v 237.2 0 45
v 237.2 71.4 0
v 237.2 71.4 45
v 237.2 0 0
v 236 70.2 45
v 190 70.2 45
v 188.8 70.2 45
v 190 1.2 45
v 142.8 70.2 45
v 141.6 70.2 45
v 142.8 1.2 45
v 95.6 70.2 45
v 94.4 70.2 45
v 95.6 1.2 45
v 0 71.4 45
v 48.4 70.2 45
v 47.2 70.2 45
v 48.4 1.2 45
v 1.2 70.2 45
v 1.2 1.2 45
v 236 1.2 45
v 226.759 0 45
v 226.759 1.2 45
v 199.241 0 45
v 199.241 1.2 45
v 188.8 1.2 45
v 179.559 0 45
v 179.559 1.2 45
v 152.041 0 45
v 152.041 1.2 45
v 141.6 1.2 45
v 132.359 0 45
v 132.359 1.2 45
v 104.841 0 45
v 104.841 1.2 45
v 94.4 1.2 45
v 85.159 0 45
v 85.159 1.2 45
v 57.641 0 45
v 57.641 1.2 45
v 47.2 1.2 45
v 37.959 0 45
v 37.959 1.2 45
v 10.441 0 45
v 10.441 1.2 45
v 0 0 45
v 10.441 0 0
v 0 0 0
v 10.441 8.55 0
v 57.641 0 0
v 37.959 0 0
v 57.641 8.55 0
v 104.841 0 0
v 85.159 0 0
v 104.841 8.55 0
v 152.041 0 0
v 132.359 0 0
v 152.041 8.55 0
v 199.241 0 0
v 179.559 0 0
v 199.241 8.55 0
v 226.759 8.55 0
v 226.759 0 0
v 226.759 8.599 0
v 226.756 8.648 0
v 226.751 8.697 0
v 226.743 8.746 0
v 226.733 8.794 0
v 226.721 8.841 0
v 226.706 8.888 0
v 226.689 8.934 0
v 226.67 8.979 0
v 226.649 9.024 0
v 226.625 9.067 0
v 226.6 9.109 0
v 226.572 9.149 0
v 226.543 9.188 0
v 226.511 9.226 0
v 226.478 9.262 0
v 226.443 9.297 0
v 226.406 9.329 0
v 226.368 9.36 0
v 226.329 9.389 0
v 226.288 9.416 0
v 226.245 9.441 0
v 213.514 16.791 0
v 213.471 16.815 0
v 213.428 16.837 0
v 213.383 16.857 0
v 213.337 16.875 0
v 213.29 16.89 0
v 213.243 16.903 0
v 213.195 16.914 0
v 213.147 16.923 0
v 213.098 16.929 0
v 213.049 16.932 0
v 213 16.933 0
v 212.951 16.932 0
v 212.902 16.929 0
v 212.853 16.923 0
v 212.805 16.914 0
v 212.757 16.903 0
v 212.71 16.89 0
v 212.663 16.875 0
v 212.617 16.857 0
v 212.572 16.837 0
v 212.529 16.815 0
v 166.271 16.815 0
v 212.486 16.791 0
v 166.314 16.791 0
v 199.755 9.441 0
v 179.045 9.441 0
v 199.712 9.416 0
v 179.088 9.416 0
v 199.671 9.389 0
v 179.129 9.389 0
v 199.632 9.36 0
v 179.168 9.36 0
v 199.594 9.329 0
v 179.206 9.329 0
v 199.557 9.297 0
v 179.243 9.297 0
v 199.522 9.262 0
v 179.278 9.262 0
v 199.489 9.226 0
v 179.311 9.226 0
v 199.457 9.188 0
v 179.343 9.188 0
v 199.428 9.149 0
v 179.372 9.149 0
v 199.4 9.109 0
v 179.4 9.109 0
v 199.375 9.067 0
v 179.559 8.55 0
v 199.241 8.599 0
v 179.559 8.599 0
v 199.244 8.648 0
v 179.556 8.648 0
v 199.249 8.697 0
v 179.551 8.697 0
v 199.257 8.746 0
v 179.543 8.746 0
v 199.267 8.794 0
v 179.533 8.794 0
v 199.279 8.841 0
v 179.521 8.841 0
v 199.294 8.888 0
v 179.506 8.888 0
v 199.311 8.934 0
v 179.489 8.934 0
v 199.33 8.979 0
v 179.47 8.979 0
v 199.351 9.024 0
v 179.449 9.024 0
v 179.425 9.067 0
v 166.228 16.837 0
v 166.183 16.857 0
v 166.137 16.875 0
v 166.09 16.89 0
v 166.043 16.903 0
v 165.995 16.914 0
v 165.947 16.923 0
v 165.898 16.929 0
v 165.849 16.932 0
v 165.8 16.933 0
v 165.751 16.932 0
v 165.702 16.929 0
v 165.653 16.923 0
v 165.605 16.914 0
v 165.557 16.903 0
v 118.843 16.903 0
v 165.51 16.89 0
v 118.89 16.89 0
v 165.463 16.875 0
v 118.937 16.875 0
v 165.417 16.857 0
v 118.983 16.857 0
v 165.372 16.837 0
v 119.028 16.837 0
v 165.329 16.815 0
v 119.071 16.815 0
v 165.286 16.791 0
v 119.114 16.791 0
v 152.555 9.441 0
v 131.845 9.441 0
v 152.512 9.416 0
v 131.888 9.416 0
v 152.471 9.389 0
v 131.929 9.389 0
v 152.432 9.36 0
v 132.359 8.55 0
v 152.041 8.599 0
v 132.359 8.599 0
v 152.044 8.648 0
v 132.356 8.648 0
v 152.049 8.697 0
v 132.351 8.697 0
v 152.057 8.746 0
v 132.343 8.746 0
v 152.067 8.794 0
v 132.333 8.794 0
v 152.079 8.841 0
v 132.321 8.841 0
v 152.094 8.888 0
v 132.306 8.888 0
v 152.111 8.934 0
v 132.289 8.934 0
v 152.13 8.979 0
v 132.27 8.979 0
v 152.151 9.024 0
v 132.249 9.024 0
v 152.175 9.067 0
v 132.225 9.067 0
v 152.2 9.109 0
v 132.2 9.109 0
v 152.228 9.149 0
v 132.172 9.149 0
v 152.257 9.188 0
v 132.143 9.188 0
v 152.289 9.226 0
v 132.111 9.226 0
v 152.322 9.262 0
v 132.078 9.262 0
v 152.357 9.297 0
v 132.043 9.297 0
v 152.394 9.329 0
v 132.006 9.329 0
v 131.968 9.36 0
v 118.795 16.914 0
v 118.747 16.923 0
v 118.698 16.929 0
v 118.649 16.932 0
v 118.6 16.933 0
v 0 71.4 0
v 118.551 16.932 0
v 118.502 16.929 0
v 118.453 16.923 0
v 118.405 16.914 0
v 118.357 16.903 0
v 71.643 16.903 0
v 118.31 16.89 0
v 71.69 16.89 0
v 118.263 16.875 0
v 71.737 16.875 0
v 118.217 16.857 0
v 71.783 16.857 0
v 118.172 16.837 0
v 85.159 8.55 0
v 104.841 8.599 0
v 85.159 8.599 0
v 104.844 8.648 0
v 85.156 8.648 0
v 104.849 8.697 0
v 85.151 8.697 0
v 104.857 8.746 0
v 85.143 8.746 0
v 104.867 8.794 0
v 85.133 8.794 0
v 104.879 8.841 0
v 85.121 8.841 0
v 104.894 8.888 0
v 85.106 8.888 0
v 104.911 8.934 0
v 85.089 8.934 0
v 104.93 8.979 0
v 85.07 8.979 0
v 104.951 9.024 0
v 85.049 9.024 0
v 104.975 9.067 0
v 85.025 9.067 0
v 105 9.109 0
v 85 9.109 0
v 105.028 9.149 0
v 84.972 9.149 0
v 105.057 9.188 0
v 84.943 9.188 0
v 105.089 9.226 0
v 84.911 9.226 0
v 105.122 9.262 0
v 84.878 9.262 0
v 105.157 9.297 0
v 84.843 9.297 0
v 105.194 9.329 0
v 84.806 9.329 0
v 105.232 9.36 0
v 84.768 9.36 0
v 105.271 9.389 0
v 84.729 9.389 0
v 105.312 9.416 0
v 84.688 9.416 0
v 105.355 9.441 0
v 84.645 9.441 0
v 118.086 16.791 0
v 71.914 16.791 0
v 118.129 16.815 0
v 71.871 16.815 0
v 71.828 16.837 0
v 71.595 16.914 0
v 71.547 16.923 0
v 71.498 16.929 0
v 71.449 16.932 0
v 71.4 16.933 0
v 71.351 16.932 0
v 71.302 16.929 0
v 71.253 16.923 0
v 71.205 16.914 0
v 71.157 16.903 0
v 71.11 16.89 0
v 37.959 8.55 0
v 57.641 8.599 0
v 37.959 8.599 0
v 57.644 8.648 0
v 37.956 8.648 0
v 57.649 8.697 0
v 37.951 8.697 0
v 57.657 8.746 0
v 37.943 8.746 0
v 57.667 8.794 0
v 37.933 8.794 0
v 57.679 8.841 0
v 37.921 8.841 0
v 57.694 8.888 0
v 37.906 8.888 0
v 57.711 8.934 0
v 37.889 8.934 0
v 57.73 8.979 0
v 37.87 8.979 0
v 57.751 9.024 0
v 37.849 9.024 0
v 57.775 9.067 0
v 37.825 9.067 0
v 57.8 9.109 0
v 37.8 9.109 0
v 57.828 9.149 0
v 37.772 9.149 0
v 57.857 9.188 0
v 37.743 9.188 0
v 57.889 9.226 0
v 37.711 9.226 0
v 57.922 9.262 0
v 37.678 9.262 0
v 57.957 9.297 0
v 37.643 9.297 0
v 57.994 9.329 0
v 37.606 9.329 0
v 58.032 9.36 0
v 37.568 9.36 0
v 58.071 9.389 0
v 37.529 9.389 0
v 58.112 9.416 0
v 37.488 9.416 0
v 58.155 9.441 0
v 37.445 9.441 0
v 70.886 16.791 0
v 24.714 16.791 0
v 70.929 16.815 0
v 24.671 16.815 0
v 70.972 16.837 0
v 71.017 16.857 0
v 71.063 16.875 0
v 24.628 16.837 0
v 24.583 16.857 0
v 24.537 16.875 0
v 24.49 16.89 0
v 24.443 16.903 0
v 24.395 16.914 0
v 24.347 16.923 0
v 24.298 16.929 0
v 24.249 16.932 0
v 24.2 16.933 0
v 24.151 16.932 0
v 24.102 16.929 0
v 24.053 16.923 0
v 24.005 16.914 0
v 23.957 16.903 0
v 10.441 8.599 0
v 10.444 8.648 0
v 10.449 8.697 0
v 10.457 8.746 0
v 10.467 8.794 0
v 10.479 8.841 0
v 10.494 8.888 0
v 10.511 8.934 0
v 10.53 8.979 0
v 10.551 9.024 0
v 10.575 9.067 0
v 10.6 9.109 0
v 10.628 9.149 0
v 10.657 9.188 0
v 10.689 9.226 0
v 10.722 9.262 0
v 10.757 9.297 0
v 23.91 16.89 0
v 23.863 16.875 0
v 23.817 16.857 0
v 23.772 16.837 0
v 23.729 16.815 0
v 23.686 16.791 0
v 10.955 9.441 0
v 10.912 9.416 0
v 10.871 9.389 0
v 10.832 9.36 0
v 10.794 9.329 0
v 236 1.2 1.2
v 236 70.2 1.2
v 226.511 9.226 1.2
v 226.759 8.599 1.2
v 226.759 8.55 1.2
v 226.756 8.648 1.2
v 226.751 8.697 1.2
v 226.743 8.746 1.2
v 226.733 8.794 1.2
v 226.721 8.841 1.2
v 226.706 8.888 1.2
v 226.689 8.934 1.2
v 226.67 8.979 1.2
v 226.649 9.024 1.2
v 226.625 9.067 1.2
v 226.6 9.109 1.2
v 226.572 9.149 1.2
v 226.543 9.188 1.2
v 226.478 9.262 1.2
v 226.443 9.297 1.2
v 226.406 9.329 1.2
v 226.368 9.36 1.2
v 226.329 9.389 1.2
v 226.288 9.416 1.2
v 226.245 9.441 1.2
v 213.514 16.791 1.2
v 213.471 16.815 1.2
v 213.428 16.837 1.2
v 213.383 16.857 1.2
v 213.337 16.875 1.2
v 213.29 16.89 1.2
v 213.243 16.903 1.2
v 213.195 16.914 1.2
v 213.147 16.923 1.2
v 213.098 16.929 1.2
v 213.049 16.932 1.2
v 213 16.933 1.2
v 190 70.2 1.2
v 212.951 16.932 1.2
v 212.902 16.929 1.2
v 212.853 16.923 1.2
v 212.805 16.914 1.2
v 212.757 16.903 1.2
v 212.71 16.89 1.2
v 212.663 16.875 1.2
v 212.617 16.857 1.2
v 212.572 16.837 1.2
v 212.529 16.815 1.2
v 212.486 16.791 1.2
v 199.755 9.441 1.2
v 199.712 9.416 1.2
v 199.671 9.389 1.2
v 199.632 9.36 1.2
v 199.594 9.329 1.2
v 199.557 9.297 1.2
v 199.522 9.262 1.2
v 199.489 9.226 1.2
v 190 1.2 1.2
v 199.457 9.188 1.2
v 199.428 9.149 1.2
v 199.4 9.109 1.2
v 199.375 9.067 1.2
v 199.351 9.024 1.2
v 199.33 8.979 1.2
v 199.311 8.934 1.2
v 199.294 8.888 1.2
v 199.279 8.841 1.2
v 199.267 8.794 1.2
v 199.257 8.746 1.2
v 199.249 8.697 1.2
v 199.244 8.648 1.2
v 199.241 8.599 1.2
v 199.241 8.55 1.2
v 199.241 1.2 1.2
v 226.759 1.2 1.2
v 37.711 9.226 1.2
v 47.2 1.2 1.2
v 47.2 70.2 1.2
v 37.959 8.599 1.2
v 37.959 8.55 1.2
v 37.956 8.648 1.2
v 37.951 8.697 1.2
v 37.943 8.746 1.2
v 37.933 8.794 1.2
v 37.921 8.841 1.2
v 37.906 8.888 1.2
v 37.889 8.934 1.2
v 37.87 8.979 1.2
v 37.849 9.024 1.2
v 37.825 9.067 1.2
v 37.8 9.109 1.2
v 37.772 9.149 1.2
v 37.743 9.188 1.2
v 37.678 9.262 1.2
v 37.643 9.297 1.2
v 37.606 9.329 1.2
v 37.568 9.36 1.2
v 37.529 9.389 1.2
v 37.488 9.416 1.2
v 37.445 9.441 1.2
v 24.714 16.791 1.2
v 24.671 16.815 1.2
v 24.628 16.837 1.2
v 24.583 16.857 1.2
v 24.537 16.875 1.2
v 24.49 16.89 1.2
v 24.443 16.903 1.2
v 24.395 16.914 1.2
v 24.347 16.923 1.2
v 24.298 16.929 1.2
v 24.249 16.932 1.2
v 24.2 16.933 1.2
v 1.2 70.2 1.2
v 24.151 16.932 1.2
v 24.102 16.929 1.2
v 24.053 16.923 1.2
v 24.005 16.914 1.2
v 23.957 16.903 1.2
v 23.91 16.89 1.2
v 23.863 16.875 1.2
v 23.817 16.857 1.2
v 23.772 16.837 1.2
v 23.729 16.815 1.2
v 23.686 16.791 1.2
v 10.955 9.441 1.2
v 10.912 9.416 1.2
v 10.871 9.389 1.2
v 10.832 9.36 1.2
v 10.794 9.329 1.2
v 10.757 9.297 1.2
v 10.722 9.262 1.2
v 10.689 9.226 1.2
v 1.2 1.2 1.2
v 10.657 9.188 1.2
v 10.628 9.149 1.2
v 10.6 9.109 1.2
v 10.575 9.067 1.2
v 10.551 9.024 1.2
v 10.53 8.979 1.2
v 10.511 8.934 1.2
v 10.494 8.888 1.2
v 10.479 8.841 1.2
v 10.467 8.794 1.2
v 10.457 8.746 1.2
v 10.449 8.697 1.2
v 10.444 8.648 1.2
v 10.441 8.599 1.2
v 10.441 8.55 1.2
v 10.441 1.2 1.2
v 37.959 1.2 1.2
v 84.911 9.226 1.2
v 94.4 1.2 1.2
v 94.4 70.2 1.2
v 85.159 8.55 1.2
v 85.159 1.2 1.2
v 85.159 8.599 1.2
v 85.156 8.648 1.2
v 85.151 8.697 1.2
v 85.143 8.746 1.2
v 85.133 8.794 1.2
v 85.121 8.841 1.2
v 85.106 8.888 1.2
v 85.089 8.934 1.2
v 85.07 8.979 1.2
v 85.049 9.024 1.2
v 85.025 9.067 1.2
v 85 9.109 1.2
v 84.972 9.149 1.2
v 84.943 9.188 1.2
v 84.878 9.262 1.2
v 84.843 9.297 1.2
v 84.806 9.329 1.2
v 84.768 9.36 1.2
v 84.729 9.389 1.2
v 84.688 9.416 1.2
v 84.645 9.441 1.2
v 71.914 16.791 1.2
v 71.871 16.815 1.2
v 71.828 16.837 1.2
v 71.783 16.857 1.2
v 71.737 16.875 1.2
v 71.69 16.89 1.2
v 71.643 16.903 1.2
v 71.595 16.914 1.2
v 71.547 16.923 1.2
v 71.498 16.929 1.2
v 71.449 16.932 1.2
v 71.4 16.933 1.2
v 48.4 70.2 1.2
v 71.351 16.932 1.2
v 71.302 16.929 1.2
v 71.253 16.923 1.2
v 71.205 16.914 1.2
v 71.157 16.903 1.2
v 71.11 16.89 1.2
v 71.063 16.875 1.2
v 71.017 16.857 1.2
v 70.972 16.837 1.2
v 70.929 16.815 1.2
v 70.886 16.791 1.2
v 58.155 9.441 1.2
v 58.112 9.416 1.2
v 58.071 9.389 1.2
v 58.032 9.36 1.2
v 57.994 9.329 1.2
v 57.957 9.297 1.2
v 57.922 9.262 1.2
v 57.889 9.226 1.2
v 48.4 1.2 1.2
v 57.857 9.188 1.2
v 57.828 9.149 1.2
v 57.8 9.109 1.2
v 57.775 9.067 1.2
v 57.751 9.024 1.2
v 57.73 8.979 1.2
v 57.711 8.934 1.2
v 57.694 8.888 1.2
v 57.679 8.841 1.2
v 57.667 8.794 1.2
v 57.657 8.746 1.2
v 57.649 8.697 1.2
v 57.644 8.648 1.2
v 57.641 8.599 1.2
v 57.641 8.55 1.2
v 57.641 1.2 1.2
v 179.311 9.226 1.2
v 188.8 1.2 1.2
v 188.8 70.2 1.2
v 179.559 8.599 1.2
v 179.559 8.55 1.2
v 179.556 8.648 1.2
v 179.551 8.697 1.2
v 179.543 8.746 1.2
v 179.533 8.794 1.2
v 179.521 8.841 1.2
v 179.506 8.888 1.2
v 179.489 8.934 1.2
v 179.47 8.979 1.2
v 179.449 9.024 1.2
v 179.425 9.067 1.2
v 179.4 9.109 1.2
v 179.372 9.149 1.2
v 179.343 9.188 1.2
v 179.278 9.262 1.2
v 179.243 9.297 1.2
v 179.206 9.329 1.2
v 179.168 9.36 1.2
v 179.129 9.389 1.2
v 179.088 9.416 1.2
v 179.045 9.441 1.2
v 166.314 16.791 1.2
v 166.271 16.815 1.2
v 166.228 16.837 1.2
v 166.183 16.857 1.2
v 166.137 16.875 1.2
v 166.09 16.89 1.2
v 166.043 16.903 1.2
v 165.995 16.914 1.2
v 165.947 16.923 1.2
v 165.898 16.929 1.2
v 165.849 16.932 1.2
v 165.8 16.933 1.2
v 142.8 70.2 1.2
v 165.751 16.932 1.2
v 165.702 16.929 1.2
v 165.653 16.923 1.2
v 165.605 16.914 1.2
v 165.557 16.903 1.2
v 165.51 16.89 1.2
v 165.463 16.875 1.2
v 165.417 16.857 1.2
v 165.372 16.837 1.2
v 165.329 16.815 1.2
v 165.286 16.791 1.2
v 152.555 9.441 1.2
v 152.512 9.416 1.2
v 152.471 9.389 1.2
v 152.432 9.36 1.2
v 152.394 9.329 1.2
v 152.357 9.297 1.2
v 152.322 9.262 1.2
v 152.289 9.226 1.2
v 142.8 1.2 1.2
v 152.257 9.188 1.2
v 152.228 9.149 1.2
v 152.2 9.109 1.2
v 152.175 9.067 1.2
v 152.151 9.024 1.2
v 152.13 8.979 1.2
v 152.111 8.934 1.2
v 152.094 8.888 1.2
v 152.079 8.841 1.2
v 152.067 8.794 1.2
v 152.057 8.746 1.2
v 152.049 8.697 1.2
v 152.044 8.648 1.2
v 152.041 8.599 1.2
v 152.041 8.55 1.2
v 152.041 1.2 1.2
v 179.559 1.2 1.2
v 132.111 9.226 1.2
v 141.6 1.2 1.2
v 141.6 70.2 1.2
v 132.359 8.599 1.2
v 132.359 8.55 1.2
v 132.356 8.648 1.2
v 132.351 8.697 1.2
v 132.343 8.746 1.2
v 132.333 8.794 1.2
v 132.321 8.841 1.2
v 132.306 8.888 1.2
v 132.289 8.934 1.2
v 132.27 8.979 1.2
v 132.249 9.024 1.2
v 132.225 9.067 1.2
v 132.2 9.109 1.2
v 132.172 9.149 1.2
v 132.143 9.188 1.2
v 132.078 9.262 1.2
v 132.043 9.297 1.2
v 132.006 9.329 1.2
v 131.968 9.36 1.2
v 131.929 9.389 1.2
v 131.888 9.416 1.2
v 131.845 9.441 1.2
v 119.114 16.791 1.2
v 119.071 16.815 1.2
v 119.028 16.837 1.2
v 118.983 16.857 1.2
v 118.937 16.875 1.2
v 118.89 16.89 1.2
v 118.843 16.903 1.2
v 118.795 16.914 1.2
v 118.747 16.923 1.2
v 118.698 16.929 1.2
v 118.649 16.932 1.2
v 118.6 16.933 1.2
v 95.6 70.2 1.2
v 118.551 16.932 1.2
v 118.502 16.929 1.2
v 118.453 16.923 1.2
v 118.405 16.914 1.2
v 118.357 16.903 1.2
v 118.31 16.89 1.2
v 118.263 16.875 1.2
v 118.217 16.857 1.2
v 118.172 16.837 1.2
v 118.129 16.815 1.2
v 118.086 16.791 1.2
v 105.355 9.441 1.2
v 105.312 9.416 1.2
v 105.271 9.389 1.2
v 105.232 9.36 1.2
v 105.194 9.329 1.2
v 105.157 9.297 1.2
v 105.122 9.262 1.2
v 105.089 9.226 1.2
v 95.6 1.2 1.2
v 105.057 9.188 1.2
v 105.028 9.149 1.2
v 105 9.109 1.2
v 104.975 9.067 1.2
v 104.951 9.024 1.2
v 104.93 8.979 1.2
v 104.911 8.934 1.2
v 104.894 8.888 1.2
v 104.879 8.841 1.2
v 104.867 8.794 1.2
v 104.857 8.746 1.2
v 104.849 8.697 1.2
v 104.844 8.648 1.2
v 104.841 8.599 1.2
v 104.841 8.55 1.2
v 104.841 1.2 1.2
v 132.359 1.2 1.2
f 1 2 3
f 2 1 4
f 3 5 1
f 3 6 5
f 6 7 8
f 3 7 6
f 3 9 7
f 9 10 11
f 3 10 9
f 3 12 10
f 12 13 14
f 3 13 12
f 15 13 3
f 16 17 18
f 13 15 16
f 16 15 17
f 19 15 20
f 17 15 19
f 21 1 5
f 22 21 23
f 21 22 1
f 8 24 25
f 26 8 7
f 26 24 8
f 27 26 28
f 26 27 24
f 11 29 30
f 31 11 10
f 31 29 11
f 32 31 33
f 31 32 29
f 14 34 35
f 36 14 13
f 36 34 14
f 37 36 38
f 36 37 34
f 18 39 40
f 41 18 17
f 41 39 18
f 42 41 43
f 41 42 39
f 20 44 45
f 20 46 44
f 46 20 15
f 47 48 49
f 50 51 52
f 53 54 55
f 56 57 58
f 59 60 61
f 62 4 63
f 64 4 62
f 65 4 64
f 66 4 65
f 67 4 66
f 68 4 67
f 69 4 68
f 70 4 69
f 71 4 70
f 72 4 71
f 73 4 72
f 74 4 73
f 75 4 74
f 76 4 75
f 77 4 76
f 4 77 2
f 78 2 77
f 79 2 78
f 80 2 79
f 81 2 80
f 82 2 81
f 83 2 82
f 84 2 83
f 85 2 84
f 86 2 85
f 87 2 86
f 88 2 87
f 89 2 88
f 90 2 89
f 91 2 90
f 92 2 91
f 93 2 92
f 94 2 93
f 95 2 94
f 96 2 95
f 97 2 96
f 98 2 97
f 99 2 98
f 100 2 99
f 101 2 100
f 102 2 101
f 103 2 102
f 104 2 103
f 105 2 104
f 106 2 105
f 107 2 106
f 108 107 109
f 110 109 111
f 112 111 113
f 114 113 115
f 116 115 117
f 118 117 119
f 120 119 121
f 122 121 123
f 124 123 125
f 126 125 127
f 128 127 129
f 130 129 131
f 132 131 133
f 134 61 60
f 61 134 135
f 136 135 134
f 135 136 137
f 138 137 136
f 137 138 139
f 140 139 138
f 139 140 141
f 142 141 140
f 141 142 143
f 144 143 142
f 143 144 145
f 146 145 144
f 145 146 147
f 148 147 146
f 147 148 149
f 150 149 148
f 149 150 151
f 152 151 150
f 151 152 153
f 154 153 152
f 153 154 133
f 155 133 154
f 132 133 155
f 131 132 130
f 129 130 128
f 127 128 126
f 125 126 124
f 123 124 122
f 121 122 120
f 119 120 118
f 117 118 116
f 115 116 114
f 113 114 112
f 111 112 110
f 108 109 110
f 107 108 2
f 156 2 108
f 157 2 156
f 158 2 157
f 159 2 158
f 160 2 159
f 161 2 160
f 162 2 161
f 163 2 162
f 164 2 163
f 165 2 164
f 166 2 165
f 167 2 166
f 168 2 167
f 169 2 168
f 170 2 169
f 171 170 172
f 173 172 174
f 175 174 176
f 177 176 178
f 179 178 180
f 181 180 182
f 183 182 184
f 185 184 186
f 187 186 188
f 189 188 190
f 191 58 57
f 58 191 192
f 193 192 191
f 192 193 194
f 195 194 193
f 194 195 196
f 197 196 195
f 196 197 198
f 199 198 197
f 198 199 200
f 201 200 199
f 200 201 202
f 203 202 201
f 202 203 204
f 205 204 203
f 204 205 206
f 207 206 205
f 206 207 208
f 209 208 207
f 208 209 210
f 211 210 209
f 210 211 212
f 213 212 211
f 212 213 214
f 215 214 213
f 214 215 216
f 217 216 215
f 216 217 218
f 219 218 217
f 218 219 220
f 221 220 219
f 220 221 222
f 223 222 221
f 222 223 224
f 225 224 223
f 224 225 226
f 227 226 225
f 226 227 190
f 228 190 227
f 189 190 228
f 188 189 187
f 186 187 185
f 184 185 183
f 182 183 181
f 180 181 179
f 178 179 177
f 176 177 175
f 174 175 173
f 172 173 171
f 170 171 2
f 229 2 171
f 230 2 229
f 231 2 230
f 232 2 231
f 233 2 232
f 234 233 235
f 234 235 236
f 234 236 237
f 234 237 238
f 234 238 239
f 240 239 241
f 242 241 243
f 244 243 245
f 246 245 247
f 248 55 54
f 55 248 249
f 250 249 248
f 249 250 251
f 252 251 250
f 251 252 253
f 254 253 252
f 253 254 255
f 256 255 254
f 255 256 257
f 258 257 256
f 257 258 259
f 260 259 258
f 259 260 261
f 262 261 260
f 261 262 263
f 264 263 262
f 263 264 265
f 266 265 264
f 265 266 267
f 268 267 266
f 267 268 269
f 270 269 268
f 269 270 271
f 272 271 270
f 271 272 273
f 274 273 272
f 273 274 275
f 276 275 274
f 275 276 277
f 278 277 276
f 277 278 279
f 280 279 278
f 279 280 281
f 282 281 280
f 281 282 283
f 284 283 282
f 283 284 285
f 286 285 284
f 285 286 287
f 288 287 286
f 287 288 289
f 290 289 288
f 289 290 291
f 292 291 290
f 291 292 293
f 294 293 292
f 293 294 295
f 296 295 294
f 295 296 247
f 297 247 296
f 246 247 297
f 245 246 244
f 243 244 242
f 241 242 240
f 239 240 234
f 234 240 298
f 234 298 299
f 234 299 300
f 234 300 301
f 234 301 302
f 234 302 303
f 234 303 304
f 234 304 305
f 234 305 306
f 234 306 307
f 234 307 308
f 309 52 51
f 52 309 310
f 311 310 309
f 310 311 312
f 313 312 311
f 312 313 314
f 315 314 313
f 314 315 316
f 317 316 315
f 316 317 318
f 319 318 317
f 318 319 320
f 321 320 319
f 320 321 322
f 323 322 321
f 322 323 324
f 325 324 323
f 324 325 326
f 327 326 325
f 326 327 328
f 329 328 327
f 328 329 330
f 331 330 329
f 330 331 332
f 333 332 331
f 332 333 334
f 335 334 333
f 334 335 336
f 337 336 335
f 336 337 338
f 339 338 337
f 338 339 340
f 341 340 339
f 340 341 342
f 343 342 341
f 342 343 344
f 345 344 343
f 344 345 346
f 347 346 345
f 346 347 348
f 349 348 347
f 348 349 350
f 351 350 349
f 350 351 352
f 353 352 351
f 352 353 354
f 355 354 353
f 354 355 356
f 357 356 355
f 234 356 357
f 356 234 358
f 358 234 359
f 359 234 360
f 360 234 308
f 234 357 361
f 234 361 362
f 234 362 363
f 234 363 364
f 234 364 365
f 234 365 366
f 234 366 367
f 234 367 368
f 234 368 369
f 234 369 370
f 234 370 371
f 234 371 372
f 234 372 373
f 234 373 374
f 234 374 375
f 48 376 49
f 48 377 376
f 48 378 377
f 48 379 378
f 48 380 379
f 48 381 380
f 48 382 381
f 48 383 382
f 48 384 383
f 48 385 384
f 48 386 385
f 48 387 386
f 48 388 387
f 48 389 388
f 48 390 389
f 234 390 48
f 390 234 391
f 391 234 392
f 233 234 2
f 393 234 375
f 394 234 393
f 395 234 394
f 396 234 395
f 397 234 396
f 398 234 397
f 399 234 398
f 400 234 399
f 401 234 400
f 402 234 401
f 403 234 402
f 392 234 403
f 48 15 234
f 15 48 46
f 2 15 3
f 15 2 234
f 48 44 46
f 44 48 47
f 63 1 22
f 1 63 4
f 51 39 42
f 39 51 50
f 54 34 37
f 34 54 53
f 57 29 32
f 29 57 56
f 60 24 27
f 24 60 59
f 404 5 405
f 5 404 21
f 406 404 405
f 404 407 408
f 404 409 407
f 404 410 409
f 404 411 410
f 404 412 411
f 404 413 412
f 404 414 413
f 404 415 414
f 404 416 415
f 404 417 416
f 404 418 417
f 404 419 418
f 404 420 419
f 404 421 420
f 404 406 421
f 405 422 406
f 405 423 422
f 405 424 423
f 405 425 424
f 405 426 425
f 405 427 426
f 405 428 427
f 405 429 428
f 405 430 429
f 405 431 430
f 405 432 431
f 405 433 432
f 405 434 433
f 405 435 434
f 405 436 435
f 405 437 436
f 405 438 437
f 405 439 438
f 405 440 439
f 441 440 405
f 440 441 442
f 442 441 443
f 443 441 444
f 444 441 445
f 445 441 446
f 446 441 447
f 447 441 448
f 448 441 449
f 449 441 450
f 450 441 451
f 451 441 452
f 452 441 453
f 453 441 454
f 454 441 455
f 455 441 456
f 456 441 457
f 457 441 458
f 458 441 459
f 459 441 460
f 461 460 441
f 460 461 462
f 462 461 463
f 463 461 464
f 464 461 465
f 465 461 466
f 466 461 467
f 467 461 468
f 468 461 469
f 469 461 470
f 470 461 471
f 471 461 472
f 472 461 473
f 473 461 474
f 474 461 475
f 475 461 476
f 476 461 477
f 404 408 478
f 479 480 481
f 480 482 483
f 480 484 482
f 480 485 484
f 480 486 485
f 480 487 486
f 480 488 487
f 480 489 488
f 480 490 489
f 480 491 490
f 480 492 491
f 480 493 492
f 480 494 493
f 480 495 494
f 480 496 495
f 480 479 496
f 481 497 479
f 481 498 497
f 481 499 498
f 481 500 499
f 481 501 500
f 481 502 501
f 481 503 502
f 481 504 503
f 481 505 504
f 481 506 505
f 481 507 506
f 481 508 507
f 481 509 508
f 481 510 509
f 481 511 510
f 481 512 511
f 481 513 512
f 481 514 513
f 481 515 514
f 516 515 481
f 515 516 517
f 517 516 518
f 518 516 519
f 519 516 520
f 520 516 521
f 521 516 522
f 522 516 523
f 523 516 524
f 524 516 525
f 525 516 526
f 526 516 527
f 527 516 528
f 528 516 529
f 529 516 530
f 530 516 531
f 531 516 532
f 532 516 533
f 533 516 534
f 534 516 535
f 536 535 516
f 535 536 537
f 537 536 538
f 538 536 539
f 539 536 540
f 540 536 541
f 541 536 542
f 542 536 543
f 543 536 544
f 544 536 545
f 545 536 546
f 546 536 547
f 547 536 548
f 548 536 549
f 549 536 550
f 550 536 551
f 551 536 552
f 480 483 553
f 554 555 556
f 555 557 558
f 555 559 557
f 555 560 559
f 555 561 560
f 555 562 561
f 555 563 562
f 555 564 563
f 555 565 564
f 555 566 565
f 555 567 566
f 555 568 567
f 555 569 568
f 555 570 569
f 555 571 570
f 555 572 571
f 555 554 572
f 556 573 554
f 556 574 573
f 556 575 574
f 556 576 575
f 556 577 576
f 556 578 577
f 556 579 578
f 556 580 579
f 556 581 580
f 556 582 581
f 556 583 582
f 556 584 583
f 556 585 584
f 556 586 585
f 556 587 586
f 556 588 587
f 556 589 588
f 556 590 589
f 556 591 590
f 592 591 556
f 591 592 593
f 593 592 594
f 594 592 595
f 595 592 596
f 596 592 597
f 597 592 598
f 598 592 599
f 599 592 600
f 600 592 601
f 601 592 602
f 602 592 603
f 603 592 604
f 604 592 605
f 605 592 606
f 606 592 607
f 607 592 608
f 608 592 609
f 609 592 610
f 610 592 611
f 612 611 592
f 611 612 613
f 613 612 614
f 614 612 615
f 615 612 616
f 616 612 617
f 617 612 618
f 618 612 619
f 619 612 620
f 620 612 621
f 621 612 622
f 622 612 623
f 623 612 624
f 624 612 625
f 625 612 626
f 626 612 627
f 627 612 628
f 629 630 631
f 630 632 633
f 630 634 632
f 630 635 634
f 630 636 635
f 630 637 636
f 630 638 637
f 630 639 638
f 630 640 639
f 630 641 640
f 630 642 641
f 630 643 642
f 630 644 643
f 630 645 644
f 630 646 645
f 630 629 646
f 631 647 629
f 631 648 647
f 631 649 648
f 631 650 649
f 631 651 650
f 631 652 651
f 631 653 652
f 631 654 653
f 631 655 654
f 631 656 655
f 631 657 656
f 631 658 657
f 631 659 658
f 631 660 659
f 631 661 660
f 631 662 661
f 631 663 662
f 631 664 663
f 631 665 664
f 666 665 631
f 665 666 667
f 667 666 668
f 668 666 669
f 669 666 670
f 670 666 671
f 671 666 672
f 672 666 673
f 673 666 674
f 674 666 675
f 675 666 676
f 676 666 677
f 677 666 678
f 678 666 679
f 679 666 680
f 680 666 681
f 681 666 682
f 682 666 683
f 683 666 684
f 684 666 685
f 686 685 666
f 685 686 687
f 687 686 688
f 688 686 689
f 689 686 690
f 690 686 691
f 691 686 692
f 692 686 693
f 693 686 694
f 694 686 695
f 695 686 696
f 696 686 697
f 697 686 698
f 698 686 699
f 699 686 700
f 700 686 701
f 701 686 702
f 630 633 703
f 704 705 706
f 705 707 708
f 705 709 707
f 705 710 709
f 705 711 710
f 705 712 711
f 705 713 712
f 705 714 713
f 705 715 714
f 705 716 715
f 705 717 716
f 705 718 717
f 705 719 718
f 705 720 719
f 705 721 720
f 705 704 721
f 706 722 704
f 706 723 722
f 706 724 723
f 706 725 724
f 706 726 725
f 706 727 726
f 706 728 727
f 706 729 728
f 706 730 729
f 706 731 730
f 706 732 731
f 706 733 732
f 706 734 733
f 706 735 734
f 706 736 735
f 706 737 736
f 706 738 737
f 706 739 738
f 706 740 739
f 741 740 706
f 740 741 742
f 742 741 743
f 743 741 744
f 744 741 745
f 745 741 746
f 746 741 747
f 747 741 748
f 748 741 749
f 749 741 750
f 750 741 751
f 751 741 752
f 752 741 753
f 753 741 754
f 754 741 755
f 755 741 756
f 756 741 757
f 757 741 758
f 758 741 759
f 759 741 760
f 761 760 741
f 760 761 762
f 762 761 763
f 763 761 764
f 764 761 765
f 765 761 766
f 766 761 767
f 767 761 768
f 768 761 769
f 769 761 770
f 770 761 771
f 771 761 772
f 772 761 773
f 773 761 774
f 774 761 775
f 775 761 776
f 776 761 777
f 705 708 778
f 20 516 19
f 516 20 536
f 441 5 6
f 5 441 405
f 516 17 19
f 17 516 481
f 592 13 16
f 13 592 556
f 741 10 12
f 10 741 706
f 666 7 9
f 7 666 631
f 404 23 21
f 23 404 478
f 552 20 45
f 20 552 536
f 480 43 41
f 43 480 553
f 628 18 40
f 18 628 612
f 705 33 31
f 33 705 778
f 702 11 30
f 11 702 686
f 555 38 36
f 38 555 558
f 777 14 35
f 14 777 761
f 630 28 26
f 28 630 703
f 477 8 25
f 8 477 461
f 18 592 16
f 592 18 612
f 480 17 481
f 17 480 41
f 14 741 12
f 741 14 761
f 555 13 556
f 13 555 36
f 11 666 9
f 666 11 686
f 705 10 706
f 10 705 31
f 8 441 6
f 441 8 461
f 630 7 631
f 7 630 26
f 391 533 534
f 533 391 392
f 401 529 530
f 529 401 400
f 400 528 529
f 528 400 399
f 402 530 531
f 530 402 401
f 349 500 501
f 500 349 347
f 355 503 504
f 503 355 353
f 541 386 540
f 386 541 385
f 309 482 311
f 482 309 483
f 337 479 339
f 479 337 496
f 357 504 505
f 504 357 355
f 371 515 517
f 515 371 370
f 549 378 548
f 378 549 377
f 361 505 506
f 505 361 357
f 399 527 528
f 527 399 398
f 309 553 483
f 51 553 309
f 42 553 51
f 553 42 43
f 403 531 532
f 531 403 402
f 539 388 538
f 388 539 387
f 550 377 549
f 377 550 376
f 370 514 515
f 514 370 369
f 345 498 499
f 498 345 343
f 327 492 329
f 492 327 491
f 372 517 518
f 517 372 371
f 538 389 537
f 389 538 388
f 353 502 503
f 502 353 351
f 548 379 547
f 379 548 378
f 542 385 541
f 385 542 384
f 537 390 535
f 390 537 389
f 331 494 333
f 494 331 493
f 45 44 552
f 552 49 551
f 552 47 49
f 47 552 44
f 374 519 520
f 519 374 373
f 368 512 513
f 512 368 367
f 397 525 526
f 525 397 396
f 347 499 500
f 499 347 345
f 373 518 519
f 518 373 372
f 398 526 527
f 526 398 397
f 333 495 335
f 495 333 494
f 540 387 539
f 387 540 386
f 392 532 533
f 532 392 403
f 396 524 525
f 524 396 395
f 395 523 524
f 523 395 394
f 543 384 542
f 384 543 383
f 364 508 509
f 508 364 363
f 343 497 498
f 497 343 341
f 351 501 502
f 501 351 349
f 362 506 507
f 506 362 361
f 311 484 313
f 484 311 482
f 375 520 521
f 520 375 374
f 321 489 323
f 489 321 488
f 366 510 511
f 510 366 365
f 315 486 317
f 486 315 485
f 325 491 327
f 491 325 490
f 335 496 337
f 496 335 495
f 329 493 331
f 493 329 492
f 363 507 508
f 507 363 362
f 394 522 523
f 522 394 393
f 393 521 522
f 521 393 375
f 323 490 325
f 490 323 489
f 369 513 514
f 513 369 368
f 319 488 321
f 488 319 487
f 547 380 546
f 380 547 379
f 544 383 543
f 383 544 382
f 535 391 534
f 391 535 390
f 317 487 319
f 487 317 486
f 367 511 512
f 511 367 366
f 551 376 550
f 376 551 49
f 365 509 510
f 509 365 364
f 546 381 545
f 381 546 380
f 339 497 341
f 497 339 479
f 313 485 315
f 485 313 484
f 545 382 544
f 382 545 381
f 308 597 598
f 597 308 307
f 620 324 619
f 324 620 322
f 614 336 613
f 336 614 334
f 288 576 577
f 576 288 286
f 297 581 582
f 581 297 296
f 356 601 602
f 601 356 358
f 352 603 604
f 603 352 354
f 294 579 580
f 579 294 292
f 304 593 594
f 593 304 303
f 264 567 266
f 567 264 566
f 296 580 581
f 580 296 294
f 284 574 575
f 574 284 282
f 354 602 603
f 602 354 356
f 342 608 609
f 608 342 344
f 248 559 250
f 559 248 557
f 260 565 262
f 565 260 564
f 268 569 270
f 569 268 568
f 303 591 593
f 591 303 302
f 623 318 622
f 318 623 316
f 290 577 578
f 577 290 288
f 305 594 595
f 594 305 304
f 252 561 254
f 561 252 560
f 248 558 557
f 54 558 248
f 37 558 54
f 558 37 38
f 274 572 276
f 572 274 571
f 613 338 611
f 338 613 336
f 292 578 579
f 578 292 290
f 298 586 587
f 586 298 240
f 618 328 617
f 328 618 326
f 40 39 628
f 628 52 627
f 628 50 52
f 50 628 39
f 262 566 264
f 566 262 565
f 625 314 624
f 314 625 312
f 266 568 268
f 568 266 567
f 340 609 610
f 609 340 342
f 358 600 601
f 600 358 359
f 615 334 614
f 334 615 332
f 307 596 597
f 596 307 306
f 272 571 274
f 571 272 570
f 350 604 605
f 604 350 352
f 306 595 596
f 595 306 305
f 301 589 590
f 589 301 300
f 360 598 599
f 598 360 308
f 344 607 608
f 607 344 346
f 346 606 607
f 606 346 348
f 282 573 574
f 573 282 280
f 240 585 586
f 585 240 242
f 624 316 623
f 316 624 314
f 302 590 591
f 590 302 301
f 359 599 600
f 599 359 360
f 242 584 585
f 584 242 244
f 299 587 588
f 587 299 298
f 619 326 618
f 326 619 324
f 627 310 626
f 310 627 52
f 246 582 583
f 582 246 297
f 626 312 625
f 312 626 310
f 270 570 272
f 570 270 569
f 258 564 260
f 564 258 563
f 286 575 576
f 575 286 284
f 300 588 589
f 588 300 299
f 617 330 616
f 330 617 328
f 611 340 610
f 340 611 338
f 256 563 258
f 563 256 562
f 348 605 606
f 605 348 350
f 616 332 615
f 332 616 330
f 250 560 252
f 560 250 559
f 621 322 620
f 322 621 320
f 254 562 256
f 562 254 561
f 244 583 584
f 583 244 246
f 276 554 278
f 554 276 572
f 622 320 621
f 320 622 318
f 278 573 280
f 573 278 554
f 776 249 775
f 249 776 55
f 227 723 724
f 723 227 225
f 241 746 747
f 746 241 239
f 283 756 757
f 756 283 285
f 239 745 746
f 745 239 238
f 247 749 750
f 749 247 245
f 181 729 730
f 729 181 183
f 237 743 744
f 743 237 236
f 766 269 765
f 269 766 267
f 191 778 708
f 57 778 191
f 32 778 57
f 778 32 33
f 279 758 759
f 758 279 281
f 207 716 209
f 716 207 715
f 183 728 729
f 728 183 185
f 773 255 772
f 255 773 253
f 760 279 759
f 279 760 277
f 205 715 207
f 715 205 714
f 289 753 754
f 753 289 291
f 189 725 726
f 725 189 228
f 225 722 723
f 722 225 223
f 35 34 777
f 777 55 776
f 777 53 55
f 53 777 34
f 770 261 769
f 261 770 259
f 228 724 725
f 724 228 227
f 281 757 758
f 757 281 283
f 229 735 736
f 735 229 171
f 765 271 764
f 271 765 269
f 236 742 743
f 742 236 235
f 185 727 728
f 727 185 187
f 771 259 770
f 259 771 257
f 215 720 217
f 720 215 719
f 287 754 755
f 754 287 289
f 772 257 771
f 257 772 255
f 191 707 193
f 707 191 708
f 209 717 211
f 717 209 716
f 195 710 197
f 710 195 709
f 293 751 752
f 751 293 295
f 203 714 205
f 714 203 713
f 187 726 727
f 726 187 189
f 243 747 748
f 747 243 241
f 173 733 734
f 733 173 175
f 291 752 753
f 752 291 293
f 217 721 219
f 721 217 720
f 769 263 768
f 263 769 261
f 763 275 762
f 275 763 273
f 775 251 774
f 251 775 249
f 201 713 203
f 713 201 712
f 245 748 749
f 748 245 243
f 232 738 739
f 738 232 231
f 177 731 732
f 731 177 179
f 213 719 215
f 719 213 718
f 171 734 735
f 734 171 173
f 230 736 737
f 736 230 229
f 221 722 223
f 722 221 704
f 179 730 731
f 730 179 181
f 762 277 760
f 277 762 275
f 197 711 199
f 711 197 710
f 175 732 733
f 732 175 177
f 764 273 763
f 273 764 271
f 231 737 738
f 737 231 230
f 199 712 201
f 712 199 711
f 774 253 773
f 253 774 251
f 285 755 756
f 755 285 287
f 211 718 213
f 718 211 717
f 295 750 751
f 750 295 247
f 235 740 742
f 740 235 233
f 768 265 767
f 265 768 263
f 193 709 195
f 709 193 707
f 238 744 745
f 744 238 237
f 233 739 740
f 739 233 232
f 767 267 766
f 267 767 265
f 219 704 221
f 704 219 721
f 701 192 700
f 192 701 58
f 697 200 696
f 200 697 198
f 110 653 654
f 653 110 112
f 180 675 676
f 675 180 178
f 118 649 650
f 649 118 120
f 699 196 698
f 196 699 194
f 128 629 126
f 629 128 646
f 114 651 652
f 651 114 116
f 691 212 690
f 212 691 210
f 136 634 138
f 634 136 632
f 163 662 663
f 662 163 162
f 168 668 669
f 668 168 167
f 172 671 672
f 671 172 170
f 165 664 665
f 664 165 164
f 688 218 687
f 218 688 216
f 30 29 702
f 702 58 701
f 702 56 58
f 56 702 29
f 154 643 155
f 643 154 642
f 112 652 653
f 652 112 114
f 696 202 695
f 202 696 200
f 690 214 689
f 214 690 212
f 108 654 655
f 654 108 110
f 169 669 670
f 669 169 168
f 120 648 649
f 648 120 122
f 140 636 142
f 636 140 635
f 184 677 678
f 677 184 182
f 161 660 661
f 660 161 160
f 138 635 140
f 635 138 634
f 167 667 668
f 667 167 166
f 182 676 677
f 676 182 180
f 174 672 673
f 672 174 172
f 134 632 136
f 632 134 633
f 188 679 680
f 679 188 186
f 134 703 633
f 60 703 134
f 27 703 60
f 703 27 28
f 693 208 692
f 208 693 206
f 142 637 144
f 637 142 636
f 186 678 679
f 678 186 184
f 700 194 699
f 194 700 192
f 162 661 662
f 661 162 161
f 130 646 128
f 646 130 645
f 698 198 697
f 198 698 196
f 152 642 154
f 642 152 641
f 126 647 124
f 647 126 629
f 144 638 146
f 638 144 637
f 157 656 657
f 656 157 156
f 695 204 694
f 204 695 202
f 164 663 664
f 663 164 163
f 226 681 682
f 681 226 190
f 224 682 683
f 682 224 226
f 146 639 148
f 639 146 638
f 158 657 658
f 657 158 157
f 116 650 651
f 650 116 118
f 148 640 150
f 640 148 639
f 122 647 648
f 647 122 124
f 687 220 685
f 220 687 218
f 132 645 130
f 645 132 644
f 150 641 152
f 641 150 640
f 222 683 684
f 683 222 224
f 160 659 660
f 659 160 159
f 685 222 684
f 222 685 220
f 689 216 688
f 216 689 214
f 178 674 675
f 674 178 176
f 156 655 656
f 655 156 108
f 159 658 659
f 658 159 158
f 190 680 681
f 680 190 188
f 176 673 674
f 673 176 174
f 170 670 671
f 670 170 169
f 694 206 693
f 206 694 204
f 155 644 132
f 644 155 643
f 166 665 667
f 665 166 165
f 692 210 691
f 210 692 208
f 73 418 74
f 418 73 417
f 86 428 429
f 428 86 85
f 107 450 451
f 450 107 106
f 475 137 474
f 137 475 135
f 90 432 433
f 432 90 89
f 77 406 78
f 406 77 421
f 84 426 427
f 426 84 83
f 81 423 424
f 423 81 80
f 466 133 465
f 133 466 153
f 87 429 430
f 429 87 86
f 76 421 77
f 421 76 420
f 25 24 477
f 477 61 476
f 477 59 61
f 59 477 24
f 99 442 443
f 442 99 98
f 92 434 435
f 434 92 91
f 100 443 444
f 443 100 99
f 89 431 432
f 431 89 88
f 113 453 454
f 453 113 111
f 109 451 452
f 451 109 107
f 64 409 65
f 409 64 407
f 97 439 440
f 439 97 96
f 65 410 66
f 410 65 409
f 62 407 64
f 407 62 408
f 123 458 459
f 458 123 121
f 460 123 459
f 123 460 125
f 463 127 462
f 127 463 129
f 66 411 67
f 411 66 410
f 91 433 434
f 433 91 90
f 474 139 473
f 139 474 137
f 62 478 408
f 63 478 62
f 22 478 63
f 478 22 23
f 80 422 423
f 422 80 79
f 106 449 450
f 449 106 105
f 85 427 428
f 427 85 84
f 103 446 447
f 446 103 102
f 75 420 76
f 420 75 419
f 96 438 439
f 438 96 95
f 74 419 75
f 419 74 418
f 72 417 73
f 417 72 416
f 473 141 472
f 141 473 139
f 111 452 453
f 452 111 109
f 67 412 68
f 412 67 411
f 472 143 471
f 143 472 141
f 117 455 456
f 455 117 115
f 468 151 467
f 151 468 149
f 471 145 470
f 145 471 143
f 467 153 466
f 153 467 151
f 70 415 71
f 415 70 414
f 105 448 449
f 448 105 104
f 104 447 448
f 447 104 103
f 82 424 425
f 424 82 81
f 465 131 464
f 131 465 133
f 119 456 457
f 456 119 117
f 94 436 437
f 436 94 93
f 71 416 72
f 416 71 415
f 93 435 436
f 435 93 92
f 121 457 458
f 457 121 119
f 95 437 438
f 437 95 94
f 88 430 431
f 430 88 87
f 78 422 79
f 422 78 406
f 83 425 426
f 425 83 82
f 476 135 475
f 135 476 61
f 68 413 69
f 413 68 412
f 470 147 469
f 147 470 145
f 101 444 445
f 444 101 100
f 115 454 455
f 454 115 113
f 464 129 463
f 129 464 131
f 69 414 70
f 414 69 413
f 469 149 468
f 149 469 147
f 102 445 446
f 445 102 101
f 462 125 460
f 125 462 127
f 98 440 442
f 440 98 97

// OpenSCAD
// file: ../../internal/tray.scad
// Copyright 2023 Joshua Star, All Rights Reserved

include <base.scad>
include <prim.scad>

module tray_basic(inner_size, r=0, thickness=DEFAULT_THICKNESS, bottom_thickness=undef) {

	half_z = inner_size.z / 2;
	radius = min(r, half_z);

	bottom_thk = bottom_thickness != undef ? bottom_thickness : thickness;

	thk2 = thickness * 2;

	outer_size = inner_size + [thk2, thk2, bottom_thk];
	echo("tray outer dimensions are: ", outer_size);

	inner_radius = radius - thickness;

	union() {
		difference() {
			// outer shell
			if (0 < r) {
				union() {
					translate([0, 0, bottom_thk])
						cylinder_cube([outer_size.x, outer_size.y, outer_size.z - bottom_thk], r=radius);
					cylinder_cube([outer_size.x, outer_size.y, bottom_thk], inner_radius, radius);
				}
			}
			else {
				cube(outer_size);
			}
			
			// lip cutout
			if (0 < radius) {
				translate([0, 0, inner_size.z + SMALL_NUM])
					cylinder_cube([outer_size.x, outer_size.y, bottom_thk], r1=inner_radius, r2=radius);
			}

			// inner cutout
			if (0 < radius) {
				translate([thickness, thickness, bottom_thk])
					rounded_cube(inner_size + [0, 0, bottom_thk], r=inner_radius, flat_top=true);
			}
			else {
				translate([thickness, thickness, bottom_thk])
						cube(inner_size + [0, 0, bottom_thk]);
			}
		}
	}
}

module tray_divided(size, r=0, div_x=1, div_y=1, thickness=DEFAULT_THICKNESS, bottom_thickness=undef, div_height=undef, div_thickness=undef) {

	bottom_thk = bottom_thickness != undef ? bottom_thickness : thickness;

	div_thk = div_thickness != undef ? div_thickness : thickness;
	div_z = div_height != undef ? div_height : size.z;

	max_div_z = 0 == r ? size.z : size.z - bottom_thk;
	clamped_div_z = min(div_z, max_div_z);

	x_minus_div = size.x - (div_thk * (div_x - 1));
	y_minus_div = size.y - (div_thk * (div_y - 1));

	x_off = (x_minus_div / div_x) + div_thk;
	y_off = (y_minus_div / div_y) + div_thk;
	
	union() {
		tray_basic(size, r=r, thickness=thickness, bottom_thickness=bottom_thk);

		// columns, along x
		for (i=[1:1:div_x-1]) {
			translate([i * x_off, thickness, bottom_thk])
				cube([div_thk, size.y, clamped_div_z]);
		}

		// rows, along y
		for (i=[1:1:div_y-1]) {
			translate([thickness, i * y_off, bottom_thk])
				cube([size.x, div_thk, clamped_div_z]);
		}
	}
}

module notch_cutter(h, r) {
	n = 6;
	rotate([0, 0, 180 / n]) cylinder_ngon(2 * r, h, n);
}

module tray_notched(size, div_x=1, div_y=1, thickness=DEFAULT_THICKNESS, bottom_thickness=undef, div_height=undef, div_thickness=undef, notch_lo_x=true, notch_hi_x=true) {

	bottom_thk = bottom_thickness != undef ? bottom_thickness : thickness;

	div_thk = div_thickness != undef ? div_thickness : thickness;
	div_z = div_height != undef ? div_height : size.z;

	x_minus_div = size.x - (div_thk * (div_x - 1));

	x_off = (x_minus_div / div_x) + div_thk;
	
	div_bias = (div_thk - x_off) / 2;

	notch_h = size.z + bottom_thk + 2 * SMALL_NUM;
	notch_r = x_off / 3;

	difference() {
		tray_divided(size, div_x=div_x, div_y=div_y, thickness=thickness, bottom_thickness=bottom_thk, div_height=div_z, div_thickness=div_thk);

		// notch along x
		for (i=[1:1:div_x]) {

			if (notch_lo_x) {
				translate([i * x_off + div_bias, thickness, -SMALL_NUM])
					notch_cutter(notch_h, notch_r);
			}

			if (notch_hi_x) {
				translate([i * x_off + div_bias, size.y + thickness, -SMALL_NUM])
					notch_cutter(notch_h, notch_r);
			}
		}
	}
}

// --- TESTING ---

//tray_basic([240, 120, 30], r=4);

//translate([-1.2, -1.2, 0]) tray_divided([200, 100, 5], div_x=20, div_y=10);
//tray_divided([180, 120, 30], r=15, div_x=3, div_y=2, div_height=25);

//translate([-1.2, -1.2, 0]) tray_notched([200, 100, 30], div_x=20, div_y=10);
// file: ../../internal/prim.scad
// Copyright 2023 Joshua Star, All Rights Reserved

module cylinder_cube(size, r1=1, r2=1, r=undef) {
	r1 = r != undef ? r : r1;
	r2 = r != undef ? r : r2;

	r_max = max(r1, r2);
	hull() {
		translate([r_max, r_max, 0])
			cylinder(size.z, r1, r2);
		translate([size.x - r_max, r_max, 0])
			cylinder(size.z, r1, r2);
		translate([r_max, size.y - r_max, 0])
			cylinder(size.z, r1, r2);
		translate([size.x - r_max, size.y - r_max, 0])
			cylinder(size.z, r1, r2);
	}
}

module cylinder_ngon(width, h, n=6, r=1) {
	hull() {
		for (i=[0:1:n-1]) {
			angl_off = 360 / n;
			posx_off = width / 2 - r;
			rotate([0, 0, i * angl_off]) translate([posx_off, 0, 0])
				cylinder(r=r, h=h);
		}
	}
}

module cylinder_trap(size, ratio, radius=1) {
	hull() {
		half_size_x = size.x / 2;
		translate([radius - half_size_x, radius, 0])
			cylinder(r=radius, h=size.z);
		translate([half_size_x - radius, radius, 0])
			cylinder(r=radius, h=size.z);
		translate([radius - ratio * half_size_x, size.y - radius, 0])
			cylinder(r=radius, h=size.z);
		translate([ratio * half_size_x - radius, size.y - radius, 0])
			cylinder(r=radius, h=size.z);
	}
}

module rounded_cube(size, r=1, flat_top=false) {
	
	half_z = size.z / 2;
	radius = min(r, half_z);
	
	hull() {
		// bottom 'points'
		translate([radius,radius,radius]) sphere(r=radius);
		translate([size.x-radius,radius,radius]) sphere(r=radius);
		translate([radius,size.y-radius,radius]) sphere(r=radius);
		translate([size.x-radius,size.y-radius,radius]) sphere(r=radius);

		// top 'points'
		pos_z = size.z - radius;
		if (flat_top) {
			translate([radius, radius, pos_z]) cylinder(r=radius, h=radius);
			translate([size.x-radius, radius, pos_z]) cylinder(r=radius, h=radius);
			translate([radius, size.y-radius, pos_z]) cylinder(r=radius, h=radius);
			translate([size.x-radius, size.y-radius, pos_z]) cylinder(r=radius, h=radius);
		}
		else {
			translate([radius, radius, pos_z]) sphere(r=radius);
			translate([size.x-radius, radius, pos_z]) sphere(r=radius);
			translate([radius, size.y-radius, pos_z]) sphere(r=radius);
			translate([size.x-radius, size.y-radius, pos_z]) sphere(r=radius);
		}
	}
}

// --- TESTING ---

//cylinder_cube([240, 120, 30], r=8);

//cylinder_cube([240, 120, 16], r1=4, r2=8);
//cylinder_cube([240, 120, 16], r1=8, r2=4);

//cylinder_ngon(10, 5, 7, 1);

//cylinder_trap([100, 50, 30], 0.5, radius=8);

//rounded_cube([240, 120, 30], r=12);
//rounded_cube([240, 120, 30], r=12, flat_top=true);
//rounded_cube([240, 120, 30], r=30, flat_top=true);
// file: ../../internal/math.scad
// Copyright 2023 Joshua Star, All Rights Reserved

function clamp(x, lower, upper) = x < lower ? lower : (upper < x ? upper : x);
function lerp(lower, upper, s) = (upper - lower) * s + lower;
// file: ../../internal/card.scad
// Copyright 2023 Joshua Star, All Rights Reserved

TOLERANCE_MIN = [0.4, 0.4];
TOLERANCE_MAX = [0.8, 0.8];

function std_card_dim() = [67, 93] + TOLERANCE_MIN; // gray
function amer_card_dim() = [59, 91] + TOLERANCE_MIN; // green
function euro_card_dim() = [62, 94] + TOLERANCE_MIN; // purple

function mini_amer_card_dim() = [44, 67] + TOLERANCE_MIN; // yellow
function mini_euro_card_dim() = [46, 71] + TOLERANCE_MIN; // ruby

function 7won_card_dim() = [67, 103] + TOLERANCE_MAX; // brown
function tarot_card_dim() = [73, 122] + TOLERANCE_MAX; // orange

function per_card_thickness() = 0.68;

function calc_card_stack(n, padding=1.2) = n * per_card_thickness() + padding;
function calc_card_count(d, padding=1.2) = (d - padding) / per_card_thickness();
// file: ../../internal/boxes.scad
// Copyright 2023 Joshua Star, All Rights Reserved

function gamebox_common() = [286, 286, 68]; // Terraforming Mars, Wingspan

function gamebox_ffg_10() = [254, 254, 48]; // Cave Troll, Drakon (4th ed), Elder Sign
function gamebox_ffg_11() = [290, 290, 70]; // 11.5 in.
function gamebox_ffg_revised_lcg() = [280, 238, 70]; // Marvel Champions
// file: ../../internal/base.scad
// Copyright 2023 Joshua Star, All Rights Reserved

fn = $preview ? 16 : 128;
$fn = fn;

SMALL_NUM = $preview ? 0.02 : 0.001;

DEFAULT_PADDING = 1.6;
DEFAULT_THICKNESS = 1.2;

function default_padding() = DEFAULT_PADDING;
function default_thickness() = DEFAULT_THICKNESS;

function make_list(v, n) = [for(i=[0:n-1]) v];
function sum_list(v) = [for(p=v) 1] * v;
// file: ../../boardgame_tk.scad
// Copyright 2023 Joshua Star, All Rights Reserved

include <internal/base.scad>
include <internal/boxes.scad>
include <internal/card.scad>
include <internal/math.scad>
include <internal/prim.scad>
include <internal/tray.scad>

module card_display(card_size, height, num_stacks, padding=DEFAULT_PADDING, thickness=DEFAULT_THICKNESS, bottom_thickness=undef, div_thickness=undef) {

	div_thk = div_thickness != undef ? div_thickness : thickness;

	dim_x = (card_size.x + padding) * num_stacks + (div_thk * (num_stacks - 1));
	dim_y = card_size.y + padding;
	dim_z = height;

	tray_notched([dim_x, dim_y, dim_z], div_x=num_stacks, thickness=thickness, bottom_thickness=bottom_thickness, div_thickness=div_thickness, notch_hi_x=false);
}

module vertical_cutter(size, r=0.5) {
	difference() {
		translate([0, size.z, 0]) rotate([90, 0, 0])
		linear_extrude(height=size.z) {
			translate([0, r, 0])
			offset(r=-r) {
				offset(r=2*r) {
					union() {
						translate([-(size.x + 2 * r) / 2, 0, 0]) square([size.x + 2 * r, 1]);
						translate([-(size.x - 2 * r)/2, -size.y, 0]) square([size.x - 2 * r, size.y]);
					}
				}
			}
		}

		translate([-(size.x + r), -size.z, 0])
			cube([2 * (size.x + r), 3 * size.z, 2 * (size.y + r)]);
	}
}

module card_tray(card_size, stacks, num_columns=1, padding=[0.8, 0.8, 0.8], thickness=DEFAULT_THICKNESS, bottom_thickness=undef, div_height=undef, div_thickness=undef) {

	bottom_thk = bottom_thickness != undef ? bottom_thickness : thickness;

	div_thk = div_thickness != undef ? div_thickness : thickness;

	col_dim_x = card_size.y + padding.x;

	dim_x = col_dim_x * num_columns + div_thk * (num_columns - 1);
	dim_y = sum_list(stacks) + (div_thk + padding.y) * (len(stacks) - 1);
	dim_z = card_size.x + padding.z;

	div_z = div_height != undef ? div_height : dim_z;

	min_card_dim = min(card_size.x, card_size.y);
	cutter_radius = min_card_dim / 6;

	difference() {
		union() {
			tray_divided([dim_x, dim_y, dim_z], div_x=num_columns, thickness=thickness, bottom_thickness=bottom_thickness);

			div_offsets = [
				for (a=0, b=stacks[0]; a < (len(stacks) - 1); a = a + 1, b = b + (stacks[a]==undef?0:stacks[a]) + padding.y + div_thk)
					b
				];

			// columns, along x
			for (c=[0:1:num_columns-1]) {
				// rows, along y
				for (y=div_offsets) {
					x_off = c * (col_dim_x + div_thk) + thickness;

					translate([x_off, y, bottom_thk])
						cube([col_dim_x, div_thk, div_z]);
				}
			}
		}

		cutout_size = [col_dim_x / 2, dim_z / 2, thickness + 2 * SMALL_NUM];
		cutout_z = bottom_thk + dim_z + SMALL_NUM;

		// cutout
		for (c=[0:1:num_columns-1]) {
			n = 8;

			x_off = c * (col_dim_x + div_thk) + (col_dim_x / 2) + thickness;

			// front cut
			translate([x_off, -SMALL_NUM, cutout_z])
					vertical_cutter(cutout_size, r=cutter_radius);
			
			// back cut
			translate([x_off, dim_y + thickness - SMALL_NUM, cutout_z])
					vertical_cutter(cutout_size, r=cutter_radius);
			
			// middle cut
			translate([x_off, thickness, bottom_thk + div_z + SMALL_NUM])
					vertical_cutter([cutout_size.x, div_z / 2, dim_y], r=cutter_radius);
		}
	}
}

module spacer(size, r=16, div_x=2, div_y=2, spacing=16) {
	difference() {
		cylinder_cube(size, r=r);

		half_spacing = spacing / 2;
		inner_radius = r - half_spacing;

		offset_x = size.x / div_x;
		offset_y = size.y / div_y;
		for (i=[0:1:div_x]) {
			for (j=[0:1:div_y]) {
				translate([i * offset_x + half_spacing, j * offset_y + half_spacing, -1])
				cylinder_cube([
					size.x / div_x - spacing,
					size.y / div_y - spacing,
					size.z + 2], r=inner_radius);
			}
		}
	}
}

module pegs_grid(rows=1, cols=1, radius=1, height=1, spacing=1, alt_pack=false) {
	x_start = spacing + radius;
	y_start = spacing + radius;

	x_alt_start = radius + spacing / 2;

	x_offset = 2 * radius + spacing;
	y_offset = alt_pack ? ((radius + spacing / 2) * sqrt(3)) : 2 * radius + spacing;

	for (r=[0:1:rows-1]) {
		is_alt = alt_pack ? (r % 2) : 0;
		for (c=[0:1:cols-(1 + is_alt)]) {
			translate([
					c * x_offset + x_start + x_alt_start * is_alt,
					r * y_offset + y_start,
					0])
				cylinder(h=height, r=radius);
		}
	}
}

module peg_board(rows=1, cols=1, radius=1, height=1, spacing=1) {
	difference() {
		cylinder_cube([
			cols * 2 * radius + (cols + 1) * spacing,
			rows * 2 * radius + (rows + 1) * spacing,
			height], r=radius);

		translate([0, 0, -height/2])
			pegs_grid(rows=rows, cols=cols, radius=radius, height=2*height, spacing=spacing, alt_pack=false);
	}
}

// --- TESTING ---

//card_display(mini_euro_card_dim(), 30, 3);

//vertical_cutter([100,50, 10], r=10);

//card_tray(std_card_dim(), [30, 30, 8, 8, 8, 16, 42], num_columns=4, div_height=55);

//spacer([240, 120, 10], r=16, div_x=4, div_y=3, spacing=8);

//pegs_grid(rows=4, cols=5, radius=32, height=4, spacing=6, alt_pack=false);
//pegs_grid(rows=4, cols=5, radius=32, height=4, spacing=6, alt_pack=true);

//peg_board(rows=3, cols=4, radius=28, height=4, spacing=6);
// main file
// Copyright 2023 Joshua Star, All Rights Reserved

use <../../boardgame_tk.scad>

slots = 5;

dim_z = gamebox_ffg_10().z - default_thickness() - 3;
echo("Tray should hold approximately ", calc_card_count(dim_z), " cards per slot.");

card_display(mini_amer_card_dim(), dim_z, slots);
